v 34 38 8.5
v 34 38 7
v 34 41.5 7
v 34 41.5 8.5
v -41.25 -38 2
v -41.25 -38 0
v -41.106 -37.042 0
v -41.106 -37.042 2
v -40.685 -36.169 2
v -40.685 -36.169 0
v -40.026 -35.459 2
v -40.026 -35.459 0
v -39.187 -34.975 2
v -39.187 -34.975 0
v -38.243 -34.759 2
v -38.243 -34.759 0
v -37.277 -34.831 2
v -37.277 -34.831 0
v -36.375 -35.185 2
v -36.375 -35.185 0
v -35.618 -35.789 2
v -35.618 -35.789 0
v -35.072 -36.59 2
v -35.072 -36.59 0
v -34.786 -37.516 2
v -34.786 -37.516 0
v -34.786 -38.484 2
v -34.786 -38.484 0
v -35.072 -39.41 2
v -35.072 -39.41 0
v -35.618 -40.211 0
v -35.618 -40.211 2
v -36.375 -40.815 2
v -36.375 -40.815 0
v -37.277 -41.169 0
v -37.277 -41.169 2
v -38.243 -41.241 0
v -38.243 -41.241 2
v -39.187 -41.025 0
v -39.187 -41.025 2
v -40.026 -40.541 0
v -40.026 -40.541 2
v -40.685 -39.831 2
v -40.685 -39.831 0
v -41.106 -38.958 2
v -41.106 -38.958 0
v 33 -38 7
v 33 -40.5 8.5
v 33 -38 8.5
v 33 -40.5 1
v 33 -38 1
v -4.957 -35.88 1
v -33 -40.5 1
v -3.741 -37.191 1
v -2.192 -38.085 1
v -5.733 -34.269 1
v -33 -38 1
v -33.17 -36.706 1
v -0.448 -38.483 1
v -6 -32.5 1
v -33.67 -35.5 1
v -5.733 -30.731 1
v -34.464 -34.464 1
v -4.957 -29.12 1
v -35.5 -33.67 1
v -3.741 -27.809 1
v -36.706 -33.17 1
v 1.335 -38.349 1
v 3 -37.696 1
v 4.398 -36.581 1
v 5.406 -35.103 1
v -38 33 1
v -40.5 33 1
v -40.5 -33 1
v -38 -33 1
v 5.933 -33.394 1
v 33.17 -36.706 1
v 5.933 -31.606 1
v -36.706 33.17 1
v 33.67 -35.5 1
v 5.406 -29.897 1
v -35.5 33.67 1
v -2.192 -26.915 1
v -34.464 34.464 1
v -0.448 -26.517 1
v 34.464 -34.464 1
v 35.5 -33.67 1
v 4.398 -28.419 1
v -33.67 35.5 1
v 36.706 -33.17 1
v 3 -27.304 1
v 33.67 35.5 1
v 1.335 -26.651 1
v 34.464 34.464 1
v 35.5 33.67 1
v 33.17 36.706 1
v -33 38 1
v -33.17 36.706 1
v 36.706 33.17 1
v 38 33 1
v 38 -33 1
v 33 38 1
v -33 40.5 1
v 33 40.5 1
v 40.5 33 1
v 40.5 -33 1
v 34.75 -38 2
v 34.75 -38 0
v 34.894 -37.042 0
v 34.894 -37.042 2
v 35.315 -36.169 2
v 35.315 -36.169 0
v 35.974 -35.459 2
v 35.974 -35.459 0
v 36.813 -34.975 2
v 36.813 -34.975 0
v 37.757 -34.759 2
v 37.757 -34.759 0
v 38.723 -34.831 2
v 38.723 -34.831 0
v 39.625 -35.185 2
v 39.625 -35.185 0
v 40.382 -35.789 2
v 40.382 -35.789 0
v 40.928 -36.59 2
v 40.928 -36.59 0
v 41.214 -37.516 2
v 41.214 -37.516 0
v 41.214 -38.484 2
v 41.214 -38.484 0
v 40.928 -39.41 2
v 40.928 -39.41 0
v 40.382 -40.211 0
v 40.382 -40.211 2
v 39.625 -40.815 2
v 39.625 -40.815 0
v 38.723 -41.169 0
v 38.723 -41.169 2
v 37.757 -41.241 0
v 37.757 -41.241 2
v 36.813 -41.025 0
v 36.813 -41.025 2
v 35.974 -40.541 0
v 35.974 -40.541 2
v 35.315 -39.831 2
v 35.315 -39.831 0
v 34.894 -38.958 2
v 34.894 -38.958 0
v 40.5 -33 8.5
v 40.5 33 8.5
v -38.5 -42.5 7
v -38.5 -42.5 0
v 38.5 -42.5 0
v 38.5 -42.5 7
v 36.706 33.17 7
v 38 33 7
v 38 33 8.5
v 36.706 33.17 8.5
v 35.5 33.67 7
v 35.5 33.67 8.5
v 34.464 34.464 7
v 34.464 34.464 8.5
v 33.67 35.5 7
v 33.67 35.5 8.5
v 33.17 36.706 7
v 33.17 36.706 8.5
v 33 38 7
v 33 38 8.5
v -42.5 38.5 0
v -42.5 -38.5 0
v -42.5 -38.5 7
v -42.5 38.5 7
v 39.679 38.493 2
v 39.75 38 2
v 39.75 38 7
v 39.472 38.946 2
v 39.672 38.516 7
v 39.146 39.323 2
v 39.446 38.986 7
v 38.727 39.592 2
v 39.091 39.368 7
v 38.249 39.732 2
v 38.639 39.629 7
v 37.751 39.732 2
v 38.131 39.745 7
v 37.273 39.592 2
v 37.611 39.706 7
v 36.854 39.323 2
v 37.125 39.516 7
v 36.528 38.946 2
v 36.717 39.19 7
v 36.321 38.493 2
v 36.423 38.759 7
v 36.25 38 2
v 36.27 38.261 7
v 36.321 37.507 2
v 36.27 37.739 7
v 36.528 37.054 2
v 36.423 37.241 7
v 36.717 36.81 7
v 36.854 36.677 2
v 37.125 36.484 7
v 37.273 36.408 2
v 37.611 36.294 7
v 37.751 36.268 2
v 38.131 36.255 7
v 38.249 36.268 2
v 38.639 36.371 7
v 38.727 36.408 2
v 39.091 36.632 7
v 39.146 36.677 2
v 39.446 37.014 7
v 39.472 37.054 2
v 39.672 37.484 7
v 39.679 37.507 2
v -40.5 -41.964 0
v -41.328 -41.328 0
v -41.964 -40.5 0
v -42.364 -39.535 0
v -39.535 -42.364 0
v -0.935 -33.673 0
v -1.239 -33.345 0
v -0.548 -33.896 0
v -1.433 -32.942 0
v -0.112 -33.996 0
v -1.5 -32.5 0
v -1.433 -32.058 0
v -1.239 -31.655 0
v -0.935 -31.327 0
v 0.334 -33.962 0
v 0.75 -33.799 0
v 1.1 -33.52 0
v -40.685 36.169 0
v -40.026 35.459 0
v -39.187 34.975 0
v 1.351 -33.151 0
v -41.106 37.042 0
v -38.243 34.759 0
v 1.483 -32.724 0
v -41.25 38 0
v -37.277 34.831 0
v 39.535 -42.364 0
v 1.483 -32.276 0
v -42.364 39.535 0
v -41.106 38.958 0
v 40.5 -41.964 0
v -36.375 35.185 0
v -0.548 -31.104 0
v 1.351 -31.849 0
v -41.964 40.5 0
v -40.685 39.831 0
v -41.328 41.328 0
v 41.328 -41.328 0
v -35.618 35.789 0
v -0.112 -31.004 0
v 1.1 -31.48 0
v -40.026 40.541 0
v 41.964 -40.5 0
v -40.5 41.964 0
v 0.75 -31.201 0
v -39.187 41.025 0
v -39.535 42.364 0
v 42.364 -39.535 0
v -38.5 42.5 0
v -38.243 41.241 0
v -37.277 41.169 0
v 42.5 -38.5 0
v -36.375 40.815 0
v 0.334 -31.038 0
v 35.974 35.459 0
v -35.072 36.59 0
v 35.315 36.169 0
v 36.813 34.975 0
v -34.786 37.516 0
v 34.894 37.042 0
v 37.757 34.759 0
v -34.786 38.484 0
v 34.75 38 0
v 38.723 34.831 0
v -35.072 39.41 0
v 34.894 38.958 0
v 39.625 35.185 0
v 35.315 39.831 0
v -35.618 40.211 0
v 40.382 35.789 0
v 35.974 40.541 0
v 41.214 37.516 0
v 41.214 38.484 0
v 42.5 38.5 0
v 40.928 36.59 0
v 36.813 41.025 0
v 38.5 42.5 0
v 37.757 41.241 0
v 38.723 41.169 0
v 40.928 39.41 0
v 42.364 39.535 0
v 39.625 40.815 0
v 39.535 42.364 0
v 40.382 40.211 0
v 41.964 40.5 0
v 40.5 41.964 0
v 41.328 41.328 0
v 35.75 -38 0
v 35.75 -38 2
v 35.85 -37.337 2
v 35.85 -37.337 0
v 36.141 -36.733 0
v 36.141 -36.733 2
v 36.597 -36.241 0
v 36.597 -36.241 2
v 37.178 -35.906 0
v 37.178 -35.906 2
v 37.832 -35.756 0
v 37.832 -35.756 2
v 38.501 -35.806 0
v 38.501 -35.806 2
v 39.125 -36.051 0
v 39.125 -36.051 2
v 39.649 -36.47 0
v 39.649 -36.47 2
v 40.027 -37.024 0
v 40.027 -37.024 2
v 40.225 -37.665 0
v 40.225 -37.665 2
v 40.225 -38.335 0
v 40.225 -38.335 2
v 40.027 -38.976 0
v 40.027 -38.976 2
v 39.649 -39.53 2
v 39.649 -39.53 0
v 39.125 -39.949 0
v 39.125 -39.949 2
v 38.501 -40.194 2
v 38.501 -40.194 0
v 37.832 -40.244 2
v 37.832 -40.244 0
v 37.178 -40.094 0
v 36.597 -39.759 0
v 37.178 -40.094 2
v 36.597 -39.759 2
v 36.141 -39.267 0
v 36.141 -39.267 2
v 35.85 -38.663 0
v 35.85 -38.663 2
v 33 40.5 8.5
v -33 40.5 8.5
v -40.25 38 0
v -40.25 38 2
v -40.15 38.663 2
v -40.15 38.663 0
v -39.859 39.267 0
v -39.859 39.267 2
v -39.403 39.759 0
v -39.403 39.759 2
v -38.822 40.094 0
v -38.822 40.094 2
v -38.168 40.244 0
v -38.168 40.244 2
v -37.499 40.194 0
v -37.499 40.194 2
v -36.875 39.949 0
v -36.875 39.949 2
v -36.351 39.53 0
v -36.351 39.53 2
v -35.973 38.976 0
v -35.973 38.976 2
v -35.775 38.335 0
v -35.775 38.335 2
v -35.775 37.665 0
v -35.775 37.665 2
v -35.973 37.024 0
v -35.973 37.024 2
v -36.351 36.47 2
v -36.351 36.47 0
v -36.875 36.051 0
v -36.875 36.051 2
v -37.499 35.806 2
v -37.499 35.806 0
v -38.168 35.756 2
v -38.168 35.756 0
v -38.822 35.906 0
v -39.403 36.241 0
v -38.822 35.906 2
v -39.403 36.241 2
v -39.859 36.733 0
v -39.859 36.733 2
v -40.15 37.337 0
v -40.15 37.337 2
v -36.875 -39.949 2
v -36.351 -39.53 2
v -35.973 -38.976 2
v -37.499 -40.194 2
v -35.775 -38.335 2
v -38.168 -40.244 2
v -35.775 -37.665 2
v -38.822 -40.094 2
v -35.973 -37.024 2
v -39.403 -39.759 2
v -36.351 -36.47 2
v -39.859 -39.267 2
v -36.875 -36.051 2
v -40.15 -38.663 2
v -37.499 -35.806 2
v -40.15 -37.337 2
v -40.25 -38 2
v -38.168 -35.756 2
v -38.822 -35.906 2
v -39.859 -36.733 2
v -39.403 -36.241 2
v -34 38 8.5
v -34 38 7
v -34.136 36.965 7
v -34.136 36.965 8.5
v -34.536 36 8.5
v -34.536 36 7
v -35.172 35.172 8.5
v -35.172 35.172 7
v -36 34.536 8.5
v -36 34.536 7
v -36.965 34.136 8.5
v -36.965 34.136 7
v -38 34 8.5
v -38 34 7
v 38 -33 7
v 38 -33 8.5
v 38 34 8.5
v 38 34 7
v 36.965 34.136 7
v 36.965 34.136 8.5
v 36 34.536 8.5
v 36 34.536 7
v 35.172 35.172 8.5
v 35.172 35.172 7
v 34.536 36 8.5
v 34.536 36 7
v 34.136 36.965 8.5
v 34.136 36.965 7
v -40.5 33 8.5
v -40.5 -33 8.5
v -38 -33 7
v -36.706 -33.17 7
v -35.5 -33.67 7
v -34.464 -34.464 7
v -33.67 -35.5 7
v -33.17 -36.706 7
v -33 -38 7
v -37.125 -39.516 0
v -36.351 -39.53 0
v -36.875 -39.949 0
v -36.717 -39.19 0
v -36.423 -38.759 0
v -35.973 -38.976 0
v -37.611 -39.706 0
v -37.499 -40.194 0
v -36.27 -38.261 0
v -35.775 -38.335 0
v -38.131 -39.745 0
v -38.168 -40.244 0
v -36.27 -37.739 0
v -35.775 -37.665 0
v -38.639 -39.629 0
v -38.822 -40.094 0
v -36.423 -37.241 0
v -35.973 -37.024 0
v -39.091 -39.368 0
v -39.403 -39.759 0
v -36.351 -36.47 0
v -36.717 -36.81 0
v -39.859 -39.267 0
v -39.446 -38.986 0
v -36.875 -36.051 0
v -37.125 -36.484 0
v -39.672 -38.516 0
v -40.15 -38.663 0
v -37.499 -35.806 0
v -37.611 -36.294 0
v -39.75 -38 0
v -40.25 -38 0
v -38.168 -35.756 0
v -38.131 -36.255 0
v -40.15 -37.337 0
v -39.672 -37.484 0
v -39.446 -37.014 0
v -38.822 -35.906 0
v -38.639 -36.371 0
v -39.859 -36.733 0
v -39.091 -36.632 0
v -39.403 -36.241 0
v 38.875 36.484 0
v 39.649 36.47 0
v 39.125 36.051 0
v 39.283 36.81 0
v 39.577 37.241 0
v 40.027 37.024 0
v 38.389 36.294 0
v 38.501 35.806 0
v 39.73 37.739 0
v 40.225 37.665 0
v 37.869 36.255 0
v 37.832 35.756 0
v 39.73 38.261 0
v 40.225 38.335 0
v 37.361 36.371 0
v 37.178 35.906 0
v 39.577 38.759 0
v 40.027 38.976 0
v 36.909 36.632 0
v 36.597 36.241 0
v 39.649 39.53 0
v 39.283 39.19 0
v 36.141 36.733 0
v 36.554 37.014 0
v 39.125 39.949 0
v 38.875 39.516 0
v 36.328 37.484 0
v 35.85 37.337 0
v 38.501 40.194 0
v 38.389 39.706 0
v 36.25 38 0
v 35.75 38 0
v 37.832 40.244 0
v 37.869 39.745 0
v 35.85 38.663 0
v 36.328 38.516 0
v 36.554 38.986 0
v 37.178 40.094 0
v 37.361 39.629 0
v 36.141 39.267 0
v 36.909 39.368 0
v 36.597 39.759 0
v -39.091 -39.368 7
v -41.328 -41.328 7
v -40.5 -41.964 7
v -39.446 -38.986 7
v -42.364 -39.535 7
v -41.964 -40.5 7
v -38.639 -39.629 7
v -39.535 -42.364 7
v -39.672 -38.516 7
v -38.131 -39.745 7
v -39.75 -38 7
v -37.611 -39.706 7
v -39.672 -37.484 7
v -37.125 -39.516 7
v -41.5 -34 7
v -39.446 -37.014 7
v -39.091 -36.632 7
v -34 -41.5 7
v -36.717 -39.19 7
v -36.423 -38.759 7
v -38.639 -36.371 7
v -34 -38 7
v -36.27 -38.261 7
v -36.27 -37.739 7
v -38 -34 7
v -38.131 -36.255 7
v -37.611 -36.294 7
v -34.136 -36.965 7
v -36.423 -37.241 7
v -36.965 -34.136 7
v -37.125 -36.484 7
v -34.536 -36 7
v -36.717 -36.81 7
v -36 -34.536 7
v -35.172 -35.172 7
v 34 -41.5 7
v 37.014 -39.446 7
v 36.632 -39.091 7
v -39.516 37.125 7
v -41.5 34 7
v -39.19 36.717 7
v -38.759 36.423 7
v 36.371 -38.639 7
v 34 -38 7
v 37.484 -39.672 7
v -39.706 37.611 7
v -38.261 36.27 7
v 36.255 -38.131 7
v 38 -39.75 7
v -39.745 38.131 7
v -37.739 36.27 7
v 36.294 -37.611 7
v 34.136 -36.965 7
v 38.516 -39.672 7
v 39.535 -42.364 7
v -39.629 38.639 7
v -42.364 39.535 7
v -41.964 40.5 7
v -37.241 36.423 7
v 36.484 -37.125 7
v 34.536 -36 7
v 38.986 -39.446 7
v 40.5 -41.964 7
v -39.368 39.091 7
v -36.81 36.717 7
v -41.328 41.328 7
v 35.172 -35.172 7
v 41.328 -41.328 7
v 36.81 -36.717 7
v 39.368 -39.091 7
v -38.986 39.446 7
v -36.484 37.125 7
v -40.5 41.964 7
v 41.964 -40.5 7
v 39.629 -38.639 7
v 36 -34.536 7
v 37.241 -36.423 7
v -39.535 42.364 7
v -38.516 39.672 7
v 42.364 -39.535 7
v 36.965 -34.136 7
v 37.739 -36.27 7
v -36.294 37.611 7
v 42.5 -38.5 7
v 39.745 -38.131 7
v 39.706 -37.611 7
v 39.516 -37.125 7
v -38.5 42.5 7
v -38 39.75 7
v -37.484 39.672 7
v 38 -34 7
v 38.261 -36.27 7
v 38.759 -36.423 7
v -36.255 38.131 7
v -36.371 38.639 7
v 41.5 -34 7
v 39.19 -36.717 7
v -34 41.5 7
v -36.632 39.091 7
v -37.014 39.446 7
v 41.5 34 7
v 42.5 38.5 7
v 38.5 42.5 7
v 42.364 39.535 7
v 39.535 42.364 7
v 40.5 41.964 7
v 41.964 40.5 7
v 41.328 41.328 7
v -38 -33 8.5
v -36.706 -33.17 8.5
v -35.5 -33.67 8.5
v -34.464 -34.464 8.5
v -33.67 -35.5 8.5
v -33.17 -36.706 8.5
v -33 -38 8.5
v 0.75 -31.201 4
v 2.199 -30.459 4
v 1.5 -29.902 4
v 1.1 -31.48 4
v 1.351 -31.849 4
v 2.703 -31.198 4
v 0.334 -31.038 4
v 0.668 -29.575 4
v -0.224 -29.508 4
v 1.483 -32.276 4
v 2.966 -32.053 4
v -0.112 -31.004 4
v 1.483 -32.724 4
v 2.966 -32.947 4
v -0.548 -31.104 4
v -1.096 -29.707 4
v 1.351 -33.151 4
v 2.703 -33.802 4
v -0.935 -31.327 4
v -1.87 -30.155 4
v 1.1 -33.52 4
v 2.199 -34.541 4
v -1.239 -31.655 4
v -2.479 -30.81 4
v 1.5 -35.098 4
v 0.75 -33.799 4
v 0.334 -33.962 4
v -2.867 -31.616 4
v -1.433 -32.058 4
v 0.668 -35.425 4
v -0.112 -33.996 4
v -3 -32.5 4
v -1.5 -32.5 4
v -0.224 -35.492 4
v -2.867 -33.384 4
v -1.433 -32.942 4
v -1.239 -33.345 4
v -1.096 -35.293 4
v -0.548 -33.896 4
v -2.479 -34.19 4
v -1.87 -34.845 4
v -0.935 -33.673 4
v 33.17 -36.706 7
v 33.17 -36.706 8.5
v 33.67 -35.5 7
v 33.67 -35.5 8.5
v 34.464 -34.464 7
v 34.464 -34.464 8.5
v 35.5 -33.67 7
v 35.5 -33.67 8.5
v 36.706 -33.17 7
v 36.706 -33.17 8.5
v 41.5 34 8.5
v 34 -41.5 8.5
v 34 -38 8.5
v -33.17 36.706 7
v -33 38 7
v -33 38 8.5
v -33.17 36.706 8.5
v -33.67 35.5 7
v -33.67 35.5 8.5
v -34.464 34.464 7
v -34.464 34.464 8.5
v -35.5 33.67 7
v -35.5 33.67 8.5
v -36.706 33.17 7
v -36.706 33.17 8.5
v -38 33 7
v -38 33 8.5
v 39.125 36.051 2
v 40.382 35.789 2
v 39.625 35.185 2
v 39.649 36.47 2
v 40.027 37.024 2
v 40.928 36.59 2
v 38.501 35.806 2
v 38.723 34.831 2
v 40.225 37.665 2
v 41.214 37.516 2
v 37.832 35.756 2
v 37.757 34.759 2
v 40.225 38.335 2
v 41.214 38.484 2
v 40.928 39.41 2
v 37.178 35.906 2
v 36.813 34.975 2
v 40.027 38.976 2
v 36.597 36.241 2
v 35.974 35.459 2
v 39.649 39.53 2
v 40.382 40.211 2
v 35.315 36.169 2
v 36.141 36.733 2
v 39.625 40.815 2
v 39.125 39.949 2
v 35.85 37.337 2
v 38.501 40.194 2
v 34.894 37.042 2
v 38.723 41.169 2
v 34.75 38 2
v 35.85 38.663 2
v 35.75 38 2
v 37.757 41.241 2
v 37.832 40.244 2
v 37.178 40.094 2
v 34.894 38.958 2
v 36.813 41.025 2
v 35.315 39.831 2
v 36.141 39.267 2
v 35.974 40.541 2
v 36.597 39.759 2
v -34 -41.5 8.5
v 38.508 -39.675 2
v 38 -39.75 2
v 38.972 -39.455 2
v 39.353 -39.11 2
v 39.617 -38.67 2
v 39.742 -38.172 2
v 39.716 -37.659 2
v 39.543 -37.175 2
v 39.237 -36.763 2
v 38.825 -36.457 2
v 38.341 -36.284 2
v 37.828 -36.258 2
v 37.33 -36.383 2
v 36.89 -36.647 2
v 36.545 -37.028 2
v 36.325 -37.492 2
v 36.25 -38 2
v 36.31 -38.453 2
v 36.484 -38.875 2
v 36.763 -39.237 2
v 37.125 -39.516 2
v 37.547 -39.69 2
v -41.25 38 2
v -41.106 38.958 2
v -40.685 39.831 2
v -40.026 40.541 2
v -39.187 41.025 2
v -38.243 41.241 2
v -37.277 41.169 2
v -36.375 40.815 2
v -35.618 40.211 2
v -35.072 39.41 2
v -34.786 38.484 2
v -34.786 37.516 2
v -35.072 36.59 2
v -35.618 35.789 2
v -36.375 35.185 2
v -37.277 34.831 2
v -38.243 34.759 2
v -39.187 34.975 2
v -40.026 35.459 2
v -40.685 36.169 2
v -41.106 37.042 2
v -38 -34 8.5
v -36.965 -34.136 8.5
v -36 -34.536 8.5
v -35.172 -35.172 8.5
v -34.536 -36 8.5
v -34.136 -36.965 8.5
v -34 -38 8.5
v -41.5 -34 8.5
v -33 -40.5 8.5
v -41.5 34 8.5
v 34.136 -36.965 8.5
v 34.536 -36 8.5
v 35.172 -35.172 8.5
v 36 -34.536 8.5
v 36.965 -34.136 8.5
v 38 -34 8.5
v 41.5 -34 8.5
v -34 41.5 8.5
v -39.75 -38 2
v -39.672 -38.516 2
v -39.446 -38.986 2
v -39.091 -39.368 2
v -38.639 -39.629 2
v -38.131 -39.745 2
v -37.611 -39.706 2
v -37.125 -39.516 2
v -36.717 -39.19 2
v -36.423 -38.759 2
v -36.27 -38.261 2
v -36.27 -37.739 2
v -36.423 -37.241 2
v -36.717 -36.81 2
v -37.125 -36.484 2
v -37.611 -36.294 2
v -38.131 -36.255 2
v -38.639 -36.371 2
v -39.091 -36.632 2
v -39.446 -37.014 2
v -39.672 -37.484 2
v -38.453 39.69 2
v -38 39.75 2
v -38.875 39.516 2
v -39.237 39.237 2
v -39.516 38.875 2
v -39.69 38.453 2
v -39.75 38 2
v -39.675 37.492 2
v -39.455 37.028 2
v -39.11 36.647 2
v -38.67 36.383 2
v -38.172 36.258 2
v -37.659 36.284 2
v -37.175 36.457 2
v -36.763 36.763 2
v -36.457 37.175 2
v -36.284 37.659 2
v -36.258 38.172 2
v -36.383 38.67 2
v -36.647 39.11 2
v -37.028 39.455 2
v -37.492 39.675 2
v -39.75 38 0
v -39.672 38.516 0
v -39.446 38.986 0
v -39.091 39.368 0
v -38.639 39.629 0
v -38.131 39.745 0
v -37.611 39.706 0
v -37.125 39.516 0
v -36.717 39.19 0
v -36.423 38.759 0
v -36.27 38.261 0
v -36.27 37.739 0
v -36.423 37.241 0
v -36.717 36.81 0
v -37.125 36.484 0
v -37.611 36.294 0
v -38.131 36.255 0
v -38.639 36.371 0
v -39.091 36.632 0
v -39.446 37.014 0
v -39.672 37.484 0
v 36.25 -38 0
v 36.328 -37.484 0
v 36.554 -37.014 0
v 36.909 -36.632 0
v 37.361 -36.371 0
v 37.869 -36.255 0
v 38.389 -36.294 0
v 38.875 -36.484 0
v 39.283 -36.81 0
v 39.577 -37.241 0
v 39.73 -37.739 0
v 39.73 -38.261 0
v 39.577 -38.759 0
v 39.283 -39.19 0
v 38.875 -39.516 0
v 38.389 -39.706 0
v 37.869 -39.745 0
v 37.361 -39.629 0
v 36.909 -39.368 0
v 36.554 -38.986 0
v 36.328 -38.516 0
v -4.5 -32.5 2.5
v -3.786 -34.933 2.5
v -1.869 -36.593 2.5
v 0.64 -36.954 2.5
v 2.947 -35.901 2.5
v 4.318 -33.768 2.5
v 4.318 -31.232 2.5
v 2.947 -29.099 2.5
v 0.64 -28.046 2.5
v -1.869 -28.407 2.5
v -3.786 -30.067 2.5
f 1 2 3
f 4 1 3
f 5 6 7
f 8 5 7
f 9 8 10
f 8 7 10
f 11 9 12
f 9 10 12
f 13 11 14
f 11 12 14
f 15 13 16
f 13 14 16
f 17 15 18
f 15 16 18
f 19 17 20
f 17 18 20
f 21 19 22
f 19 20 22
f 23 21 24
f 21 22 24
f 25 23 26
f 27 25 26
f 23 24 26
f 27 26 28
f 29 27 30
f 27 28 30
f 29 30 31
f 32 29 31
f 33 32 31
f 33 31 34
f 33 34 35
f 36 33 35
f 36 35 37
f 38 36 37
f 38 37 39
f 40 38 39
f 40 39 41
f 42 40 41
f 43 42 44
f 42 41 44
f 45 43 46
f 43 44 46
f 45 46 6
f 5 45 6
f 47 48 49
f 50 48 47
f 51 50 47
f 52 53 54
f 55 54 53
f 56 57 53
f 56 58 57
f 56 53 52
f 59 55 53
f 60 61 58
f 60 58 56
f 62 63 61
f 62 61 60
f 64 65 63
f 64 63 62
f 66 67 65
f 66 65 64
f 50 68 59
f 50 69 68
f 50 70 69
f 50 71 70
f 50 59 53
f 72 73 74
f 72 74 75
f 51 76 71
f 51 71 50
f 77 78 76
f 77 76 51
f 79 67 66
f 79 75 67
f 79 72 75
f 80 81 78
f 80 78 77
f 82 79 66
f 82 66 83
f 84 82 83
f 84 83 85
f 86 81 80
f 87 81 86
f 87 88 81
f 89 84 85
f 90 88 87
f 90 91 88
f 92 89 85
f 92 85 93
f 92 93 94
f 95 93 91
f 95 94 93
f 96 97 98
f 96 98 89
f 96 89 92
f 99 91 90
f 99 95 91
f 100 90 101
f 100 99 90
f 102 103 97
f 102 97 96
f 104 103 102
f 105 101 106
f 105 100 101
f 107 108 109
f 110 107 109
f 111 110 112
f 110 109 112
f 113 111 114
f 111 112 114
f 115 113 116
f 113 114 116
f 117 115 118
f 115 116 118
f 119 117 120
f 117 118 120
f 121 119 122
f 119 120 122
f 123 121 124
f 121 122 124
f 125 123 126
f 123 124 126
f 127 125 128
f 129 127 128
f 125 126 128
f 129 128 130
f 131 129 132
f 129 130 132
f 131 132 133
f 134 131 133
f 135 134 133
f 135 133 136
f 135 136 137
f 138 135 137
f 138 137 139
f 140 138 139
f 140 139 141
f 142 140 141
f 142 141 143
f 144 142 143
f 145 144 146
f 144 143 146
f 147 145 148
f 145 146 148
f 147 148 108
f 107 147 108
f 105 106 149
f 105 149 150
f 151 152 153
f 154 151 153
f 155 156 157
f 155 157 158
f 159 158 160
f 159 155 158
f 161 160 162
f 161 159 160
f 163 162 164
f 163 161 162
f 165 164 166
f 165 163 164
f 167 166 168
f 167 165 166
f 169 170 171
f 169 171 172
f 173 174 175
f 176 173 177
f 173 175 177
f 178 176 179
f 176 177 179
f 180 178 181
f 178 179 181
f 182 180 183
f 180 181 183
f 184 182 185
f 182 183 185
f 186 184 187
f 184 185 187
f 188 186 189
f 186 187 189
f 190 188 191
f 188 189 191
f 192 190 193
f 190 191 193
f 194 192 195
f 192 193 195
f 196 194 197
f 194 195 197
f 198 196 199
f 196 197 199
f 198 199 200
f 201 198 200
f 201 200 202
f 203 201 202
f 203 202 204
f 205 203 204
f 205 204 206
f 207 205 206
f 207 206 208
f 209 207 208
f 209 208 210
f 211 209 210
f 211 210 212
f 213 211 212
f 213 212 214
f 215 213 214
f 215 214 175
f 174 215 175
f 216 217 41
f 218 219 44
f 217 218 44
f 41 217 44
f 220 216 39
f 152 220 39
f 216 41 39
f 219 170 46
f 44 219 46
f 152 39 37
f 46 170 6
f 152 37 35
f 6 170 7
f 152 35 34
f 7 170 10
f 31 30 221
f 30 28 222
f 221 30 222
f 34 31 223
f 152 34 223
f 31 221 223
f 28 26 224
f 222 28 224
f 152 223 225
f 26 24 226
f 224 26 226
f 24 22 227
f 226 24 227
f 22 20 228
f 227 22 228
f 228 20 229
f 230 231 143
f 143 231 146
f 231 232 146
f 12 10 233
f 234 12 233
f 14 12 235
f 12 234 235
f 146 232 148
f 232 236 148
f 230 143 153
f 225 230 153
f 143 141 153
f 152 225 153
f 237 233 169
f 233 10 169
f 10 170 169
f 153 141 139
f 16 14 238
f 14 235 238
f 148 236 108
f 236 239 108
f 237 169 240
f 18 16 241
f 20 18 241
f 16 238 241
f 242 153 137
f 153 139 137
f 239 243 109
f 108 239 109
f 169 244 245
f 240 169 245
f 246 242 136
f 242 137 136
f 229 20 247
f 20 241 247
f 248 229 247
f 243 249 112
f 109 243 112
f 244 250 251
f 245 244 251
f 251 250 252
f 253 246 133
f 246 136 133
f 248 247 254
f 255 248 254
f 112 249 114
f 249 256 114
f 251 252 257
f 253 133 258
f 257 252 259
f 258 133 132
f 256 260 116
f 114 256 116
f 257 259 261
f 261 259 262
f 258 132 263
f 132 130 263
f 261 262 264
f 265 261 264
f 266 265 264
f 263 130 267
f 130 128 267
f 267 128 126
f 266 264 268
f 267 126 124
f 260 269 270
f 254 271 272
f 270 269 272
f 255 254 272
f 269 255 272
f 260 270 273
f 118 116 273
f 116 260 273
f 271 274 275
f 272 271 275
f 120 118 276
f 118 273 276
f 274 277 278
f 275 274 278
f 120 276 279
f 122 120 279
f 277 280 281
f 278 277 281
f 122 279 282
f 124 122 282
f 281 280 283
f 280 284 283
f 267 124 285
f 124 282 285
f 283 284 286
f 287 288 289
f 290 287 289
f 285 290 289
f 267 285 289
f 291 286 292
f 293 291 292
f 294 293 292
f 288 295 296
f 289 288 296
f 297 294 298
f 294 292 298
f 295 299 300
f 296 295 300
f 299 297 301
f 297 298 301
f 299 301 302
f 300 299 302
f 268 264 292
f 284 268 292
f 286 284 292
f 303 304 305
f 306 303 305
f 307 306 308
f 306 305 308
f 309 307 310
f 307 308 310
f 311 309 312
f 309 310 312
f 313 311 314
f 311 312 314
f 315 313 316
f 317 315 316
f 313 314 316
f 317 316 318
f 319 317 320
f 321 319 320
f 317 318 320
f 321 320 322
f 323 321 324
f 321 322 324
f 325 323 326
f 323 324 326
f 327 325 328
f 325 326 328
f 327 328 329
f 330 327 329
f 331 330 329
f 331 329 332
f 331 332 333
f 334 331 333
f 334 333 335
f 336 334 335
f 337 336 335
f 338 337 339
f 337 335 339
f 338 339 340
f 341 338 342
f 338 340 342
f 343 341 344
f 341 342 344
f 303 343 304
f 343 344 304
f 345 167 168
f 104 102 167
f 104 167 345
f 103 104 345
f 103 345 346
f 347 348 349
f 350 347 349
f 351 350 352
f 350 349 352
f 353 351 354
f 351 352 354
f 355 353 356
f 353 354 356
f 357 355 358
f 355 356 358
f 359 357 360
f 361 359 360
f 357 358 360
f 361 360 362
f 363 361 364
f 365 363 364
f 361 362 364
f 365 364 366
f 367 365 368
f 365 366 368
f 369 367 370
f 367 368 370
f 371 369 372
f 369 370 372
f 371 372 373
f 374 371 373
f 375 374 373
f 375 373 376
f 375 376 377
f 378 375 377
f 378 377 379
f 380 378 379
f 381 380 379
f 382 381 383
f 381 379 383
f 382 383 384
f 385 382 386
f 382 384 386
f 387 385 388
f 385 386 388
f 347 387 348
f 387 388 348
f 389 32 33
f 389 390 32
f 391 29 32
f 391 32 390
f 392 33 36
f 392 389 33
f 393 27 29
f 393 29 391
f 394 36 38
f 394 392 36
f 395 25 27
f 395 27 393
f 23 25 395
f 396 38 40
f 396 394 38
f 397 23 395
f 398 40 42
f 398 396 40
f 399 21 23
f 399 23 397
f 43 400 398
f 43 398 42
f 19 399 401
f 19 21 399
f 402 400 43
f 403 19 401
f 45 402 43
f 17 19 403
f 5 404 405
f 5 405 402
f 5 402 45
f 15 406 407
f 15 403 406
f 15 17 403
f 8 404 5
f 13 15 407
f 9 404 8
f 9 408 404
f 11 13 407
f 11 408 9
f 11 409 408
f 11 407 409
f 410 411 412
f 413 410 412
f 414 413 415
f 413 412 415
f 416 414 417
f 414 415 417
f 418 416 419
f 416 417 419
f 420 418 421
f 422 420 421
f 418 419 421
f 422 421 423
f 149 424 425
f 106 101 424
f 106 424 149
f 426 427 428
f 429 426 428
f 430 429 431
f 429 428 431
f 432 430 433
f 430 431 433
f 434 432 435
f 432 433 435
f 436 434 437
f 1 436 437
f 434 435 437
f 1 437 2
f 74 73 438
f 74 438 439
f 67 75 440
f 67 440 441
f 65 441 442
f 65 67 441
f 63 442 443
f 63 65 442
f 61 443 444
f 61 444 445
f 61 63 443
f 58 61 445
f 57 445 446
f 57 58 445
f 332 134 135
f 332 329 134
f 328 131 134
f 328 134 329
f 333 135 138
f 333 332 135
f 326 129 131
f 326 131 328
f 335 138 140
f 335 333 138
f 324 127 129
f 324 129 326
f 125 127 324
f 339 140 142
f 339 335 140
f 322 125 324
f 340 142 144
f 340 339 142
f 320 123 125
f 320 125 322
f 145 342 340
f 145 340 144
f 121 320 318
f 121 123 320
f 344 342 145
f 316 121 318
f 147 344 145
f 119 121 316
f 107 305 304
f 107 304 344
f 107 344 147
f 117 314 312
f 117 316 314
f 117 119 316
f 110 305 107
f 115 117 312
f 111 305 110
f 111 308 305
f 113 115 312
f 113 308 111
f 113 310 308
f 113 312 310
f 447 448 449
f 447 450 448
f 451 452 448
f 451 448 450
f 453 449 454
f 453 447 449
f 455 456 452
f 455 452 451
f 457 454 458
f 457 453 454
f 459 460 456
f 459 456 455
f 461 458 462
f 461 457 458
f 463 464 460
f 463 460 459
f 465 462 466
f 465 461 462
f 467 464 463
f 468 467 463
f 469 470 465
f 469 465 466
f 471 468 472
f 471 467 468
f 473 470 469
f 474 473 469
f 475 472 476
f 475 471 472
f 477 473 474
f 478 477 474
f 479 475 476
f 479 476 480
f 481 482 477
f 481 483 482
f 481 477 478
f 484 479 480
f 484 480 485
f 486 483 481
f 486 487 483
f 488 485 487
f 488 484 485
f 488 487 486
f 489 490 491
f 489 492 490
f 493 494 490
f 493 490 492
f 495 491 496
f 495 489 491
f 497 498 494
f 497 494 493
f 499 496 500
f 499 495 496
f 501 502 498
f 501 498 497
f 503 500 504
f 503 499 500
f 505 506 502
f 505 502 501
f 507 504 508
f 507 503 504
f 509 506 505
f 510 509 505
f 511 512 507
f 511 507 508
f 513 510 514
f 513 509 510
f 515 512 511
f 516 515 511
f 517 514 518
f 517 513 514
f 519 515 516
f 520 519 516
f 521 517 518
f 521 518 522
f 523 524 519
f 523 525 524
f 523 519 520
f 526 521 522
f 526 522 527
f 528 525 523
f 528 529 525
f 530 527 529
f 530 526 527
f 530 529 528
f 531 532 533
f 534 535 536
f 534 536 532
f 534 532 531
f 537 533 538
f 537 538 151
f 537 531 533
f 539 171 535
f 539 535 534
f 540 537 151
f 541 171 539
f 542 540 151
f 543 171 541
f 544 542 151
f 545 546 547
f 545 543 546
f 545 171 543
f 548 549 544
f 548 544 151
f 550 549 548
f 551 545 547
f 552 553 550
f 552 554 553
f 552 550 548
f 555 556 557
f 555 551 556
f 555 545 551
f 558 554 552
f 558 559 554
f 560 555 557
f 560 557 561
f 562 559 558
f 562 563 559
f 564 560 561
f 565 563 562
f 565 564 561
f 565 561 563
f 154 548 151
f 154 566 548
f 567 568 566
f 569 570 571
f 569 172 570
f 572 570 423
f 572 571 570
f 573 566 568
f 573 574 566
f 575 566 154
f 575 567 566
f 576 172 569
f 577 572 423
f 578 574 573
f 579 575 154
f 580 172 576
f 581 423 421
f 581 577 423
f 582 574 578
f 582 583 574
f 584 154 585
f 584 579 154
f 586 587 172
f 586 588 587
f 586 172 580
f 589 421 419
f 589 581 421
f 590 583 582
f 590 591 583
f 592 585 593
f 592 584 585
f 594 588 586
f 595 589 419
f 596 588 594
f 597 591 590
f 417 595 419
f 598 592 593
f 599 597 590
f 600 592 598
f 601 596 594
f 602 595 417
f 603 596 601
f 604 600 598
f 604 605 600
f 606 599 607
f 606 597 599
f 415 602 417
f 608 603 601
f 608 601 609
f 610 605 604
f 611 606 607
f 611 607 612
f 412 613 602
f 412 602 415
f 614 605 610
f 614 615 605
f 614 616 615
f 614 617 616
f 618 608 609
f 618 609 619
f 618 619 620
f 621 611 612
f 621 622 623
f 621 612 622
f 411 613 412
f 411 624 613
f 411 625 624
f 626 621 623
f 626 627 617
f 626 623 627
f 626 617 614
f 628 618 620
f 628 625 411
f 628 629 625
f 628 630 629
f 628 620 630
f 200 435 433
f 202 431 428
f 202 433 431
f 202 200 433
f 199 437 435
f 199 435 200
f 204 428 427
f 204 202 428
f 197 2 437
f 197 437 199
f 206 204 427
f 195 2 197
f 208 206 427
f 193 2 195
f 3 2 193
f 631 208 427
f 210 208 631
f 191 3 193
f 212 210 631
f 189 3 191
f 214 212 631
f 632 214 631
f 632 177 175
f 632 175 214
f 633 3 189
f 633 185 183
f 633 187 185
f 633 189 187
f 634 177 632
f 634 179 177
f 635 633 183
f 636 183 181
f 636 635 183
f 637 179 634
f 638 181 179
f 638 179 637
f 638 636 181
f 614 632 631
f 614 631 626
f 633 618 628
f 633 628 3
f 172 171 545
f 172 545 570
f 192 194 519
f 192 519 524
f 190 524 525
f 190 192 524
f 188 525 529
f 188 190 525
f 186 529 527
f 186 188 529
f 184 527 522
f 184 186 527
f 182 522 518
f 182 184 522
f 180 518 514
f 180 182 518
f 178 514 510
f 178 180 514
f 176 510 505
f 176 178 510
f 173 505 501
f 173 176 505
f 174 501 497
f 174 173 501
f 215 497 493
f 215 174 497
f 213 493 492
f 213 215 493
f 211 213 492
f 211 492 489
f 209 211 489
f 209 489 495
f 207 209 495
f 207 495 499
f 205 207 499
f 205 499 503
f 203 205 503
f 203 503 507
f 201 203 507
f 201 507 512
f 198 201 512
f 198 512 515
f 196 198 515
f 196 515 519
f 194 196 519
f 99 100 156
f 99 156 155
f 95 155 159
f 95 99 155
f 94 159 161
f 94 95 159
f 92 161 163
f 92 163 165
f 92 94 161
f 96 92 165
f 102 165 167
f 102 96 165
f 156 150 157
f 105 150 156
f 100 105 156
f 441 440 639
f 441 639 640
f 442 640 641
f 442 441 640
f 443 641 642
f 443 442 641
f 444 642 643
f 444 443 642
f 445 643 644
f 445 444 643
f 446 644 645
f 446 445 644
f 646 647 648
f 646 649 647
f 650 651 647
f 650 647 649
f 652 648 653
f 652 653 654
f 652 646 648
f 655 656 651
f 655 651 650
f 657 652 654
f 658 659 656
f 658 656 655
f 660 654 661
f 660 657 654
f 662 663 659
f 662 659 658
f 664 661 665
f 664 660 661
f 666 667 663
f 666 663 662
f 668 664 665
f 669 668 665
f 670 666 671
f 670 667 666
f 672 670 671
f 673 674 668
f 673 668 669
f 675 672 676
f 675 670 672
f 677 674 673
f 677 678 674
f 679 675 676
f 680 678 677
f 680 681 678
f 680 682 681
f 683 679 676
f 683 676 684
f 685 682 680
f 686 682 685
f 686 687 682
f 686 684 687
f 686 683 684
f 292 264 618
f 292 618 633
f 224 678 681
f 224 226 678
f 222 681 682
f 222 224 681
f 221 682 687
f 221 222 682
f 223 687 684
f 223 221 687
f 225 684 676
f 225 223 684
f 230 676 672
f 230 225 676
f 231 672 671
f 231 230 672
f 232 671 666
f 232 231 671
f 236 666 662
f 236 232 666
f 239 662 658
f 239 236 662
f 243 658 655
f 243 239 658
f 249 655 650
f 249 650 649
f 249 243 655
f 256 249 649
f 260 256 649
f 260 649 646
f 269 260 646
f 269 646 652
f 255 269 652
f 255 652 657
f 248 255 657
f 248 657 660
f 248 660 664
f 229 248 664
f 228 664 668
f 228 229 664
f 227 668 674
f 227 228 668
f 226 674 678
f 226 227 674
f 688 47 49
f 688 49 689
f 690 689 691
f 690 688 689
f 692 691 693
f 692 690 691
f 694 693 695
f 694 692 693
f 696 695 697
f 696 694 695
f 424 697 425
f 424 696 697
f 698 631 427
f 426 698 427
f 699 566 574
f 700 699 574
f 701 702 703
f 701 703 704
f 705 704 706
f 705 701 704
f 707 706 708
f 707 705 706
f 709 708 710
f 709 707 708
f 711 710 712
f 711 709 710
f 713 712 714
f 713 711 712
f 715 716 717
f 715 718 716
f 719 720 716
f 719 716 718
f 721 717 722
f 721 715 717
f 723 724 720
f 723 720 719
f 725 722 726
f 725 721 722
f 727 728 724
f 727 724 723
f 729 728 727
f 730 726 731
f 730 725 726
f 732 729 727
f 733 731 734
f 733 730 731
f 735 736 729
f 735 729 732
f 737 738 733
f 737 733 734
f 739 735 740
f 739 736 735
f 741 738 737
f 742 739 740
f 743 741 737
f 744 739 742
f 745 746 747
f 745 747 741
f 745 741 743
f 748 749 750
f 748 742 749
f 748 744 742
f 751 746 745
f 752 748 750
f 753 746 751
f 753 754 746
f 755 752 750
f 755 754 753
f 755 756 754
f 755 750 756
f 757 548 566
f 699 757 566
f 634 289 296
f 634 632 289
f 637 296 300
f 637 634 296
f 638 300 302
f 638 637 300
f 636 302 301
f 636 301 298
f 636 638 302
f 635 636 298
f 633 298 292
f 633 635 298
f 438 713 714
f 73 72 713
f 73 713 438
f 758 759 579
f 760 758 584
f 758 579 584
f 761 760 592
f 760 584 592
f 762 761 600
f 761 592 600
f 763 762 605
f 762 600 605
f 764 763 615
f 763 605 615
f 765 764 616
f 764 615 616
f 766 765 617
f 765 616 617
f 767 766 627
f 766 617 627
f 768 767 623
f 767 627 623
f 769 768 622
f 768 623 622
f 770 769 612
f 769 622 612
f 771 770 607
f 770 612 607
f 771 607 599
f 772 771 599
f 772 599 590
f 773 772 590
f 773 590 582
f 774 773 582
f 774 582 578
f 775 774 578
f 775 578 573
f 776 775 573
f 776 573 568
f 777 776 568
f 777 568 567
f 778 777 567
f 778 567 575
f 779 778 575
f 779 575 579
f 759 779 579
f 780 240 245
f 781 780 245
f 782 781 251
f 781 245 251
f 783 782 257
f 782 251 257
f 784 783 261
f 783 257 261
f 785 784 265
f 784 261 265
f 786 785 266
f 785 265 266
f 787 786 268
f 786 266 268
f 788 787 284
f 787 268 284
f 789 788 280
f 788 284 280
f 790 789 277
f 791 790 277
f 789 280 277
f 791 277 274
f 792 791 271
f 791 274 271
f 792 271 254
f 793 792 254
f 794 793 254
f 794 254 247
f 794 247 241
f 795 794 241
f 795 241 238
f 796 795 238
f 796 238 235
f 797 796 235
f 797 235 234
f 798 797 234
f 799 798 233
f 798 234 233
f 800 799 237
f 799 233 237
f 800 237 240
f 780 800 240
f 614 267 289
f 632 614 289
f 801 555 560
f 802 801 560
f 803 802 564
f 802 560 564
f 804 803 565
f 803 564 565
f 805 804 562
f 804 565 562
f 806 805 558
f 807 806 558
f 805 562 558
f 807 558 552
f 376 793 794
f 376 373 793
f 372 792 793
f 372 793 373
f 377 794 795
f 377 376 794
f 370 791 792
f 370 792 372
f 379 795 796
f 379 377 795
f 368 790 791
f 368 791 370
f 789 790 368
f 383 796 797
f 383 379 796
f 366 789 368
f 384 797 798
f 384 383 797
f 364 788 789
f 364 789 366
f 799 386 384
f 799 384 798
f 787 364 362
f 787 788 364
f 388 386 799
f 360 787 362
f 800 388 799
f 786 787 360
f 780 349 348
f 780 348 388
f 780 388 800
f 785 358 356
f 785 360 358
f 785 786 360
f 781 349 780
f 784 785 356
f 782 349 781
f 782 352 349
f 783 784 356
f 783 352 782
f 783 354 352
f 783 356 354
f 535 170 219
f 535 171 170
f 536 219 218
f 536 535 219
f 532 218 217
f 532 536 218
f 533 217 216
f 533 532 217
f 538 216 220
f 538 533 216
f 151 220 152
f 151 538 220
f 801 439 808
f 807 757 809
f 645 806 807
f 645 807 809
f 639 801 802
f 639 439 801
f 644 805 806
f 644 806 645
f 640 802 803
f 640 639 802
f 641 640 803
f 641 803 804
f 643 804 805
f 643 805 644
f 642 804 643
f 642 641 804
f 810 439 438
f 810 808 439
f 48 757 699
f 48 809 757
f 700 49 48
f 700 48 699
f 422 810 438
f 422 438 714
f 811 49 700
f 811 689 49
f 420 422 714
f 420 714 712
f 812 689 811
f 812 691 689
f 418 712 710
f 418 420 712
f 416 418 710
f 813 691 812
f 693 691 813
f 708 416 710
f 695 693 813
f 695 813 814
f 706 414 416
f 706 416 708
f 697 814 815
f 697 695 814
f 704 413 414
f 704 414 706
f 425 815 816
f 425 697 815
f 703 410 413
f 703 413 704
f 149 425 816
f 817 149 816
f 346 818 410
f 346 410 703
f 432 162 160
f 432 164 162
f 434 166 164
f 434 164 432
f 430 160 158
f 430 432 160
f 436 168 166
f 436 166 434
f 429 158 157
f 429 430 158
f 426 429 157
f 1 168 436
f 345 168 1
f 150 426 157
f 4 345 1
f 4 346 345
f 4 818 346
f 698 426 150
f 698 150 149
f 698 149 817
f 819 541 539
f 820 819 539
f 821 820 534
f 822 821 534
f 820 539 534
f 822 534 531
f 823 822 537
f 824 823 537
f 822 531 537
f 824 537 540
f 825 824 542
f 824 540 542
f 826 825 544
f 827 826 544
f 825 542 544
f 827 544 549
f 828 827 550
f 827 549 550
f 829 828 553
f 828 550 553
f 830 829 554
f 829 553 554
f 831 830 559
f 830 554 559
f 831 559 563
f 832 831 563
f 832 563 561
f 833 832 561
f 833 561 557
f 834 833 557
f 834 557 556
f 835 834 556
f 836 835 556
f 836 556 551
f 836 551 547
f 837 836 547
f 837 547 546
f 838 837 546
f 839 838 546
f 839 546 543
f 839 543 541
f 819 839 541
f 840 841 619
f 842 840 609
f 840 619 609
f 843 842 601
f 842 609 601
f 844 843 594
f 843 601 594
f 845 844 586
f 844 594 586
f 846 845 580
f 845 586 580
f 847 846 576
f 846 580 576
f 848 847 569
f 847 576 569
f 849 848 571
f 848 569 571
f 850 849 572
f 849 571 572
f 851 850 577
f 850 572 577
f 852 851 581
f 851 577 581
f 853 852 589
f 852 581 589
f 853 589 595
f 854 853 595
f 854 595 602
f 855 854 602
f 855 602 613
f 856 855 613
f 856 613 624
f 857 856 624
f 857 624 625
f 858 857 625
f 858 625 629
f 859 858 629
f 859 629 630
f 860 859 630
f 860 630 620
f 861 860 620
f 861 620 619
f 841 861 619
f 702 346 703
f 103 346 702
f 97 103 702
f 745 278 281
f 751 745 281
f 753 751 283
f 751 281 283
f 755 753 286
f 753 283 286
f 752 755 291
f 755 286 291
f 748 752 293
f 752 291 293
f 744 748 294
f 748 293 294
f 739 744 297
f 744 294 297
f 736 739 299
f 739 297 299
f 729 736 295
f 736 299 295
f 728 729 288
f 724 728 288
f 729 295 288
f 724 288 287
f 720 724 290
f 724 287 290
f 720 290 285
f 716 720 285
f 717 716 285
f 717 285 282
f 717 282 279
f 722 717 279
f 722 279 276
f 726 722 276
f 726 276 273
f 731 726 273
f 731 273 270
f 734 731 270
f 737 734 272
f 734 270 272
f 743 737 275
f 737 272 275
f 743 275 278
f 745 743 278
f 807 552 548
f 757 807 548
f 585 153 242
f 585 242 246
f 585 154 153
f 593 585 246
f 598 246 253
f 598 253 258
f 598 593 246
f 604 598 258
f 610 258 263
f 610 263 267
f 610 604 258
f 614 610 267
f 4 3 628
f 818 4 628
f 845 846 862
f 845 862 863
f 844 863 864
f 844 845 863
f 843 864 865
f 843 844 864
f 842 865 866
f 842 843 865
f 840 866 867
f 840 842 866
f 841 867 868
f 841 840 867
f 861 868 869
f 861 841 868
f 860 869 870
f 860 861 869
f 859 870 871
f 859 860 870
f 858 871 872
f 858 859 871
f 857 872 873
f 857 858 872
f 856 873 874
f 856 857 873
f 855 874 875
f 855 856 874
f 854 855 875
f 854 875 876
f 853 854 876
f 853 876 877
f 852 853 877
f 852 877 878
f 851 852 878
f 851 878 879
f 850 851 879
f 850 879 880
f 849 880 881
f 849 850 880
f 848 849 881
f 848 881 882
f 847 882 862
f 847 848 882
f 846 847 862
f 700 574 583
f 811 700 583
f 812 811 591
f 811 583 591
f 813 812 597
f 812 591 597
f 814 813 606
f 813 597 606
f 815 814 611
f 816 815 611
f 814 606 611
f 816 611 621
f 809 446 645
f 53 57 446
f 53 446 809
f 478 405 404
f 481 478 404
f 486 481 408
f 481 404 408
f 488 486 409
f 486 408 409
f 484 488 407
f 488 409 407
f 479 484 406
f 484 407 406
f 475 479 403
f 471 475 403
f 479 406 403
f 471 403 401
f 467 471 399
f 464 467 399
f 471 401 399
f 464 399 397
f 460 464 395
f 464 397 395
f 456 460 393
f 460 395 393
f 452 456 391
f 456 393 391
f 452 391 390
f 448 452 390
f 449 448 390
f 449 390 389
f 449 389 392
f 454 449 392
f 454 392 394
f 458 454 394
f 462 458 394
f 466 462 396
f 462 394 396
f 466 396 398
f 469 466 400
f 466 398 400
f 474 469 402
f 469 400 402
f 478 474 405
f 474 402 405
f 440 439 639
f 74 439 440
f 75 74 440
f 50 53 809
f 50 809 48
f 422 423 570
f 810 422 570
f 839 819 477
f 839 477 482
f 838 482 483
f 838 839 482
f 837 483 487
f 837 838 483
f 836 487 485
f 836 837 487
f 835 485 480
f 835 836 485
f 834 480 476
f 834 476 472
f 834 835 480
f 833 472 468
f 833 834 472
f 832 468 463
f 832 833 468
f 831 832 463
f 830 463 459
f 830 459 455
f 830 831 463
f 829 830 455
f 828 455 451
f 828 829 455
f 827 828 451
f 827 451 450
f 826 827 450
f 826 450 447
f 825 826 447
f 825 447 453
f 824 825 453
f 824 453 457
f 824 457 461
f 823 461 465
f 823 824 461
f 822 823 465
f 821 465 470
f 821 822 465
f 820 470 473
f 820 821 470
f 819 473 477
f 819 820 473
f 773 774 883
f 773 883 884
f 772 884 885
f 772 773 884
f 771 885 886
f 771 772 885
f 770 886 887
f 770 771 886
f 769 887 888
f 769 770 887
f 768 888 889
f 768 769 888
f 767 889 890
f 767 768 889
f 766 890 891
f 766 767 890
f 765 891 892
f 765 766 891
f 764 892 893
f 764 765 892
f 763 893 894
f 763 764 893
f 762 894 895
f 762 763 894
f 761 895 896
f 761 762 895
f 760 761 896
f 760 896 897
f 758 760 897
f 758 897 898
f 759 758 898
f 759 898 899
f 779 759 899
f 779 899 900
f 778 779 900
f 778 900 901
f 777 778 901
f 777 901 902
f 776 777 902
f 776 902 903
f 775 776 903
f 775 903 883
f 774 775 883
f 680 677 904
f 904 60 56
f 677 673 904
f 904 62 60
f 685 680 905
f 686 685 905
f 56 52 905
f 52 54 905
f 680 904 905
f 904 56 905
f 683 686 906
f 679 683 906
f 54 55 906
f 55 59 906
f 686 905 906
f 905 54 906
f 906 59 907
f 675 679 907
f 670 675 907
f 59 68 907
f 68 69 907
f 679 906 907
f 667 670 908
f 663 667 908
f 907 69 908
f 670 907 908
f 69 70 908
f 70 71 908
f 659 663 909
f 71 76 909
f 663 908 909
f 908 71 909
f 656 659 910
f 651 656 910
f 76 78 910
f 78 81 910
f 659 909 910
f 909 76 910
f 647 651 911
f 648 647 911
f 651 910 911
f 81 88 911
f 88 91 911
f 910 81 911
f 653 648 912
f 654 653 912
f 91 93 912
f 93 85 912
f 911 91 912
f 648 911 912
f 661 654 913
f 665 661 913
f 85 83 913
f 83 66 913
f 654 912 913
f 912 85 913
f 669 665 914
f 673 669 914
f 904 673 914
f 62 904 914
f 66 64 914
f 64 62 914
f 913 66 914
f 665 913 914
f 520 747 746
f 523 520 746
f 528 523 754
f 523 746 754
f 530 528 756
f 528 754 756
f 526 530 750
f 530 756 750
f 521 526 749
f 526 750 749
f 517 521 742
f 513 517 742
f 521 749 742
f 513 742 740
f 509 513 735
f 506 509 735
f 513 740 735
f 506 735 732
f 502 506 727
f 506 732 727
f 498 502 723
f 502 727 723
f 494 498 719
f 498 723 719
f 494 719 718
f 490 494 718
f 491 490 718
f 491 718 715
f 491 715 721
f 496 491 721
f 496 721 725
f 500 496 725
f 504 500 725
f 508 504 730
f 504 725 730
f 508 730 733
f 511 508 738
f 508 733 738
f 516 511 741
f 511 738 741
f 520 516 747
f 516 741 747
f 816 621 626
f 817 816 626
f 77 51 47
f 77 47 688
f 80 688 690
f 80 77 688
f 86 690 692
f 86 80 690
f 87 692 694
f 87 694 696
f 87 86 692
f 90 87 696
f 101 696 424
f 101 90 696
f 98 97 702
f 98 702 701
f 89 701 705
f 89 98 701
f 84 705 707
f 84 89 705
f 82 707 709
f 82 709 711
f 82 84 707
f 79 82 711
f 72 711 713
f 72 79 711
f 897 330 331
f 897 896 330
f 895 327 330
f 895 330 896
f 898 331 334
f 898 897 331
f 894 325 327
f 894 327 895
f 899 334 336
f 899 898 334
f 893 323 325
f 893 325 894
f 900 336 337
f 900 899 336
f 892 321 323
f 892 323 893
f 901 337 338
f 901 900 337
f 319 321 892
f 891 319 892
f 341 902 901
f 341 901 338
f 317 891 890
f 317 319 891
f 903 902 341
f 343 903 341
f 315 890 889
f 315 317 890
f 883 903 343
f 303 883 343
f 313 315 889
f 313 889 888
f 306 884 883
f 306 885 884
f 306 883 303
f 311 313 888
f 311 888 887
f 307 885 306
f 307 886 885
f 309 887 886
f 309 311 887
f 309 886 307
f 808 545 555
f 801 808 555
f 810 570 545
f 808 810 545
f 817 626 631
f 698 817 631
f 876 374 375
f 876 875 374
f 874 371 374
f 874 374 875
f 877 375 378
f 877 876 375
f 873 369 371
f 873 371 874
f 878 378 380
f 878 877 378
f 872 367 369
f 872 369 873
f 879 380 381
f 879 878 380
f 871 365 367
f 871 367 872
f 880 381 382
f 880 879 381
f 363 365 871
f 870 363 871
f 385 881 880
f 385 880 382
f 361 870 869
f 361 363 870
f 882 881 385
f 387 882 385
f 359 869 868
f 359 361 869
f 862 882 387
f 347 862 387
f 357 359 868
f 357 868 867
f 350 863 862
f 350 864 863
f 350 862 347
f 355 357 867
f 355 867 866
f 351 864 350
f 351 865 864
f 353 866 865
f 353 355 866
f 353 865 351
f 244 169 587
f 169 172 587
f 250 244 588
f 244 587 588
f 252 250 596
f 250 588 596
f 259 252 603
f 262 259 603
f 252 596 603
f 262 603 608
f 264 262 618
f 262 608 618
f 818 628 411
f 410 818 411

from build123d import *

# Parameters (mm, degrees)
SKETCH1_W                = 85
SKETCH1_H                = 85
BOSS_EXTRUDE1_DEPTH      = 7
FILLET1_R                = 4
SHELL1_T                 = -2
SHELL1_THICKNESS_2_DEPTH = 1
BOSS_EXTRUDE2_START      = 1
BOSS_EXTRUDE2_DEPTH      = 6
CIRPATTERN5_COUNT        = 4
SKETCH4_R                = 1.75
CUT_EXTRUDE1_DEPTH       = 61.510329697
MOVE_FACE1_BY            = 0.5
MOVE_FACE1_2_BY          = 0.5
MOVE_FACE1_3_BY          = 0.5
MOVE_FACE1_4_BY          = 0.5
MOVE_FACE1_5_BY          = 0.5
MOVE_FACE1_6_BY          = 0.5
MOVE_FACE1_7_BY          = 0.5
MOVE_FACE1_8_BY          = 0.5
MOVE_FACE1_9_BY          = 0.5
MOVE_FACE1_10_BY         = 0.5
MOVE_FACE1_11_BY         = 0.5
MOVE_FACE1_12_BY         = 0.5
EXTRUDE_THIN1_DEPTH      = 1.5
CIRPATTERN6_COUNT        = 4
SKETCH15_R               = 3.25
CUT_EXTRUDE5_DEPTH       = 2
EXTRUDE_THIN2_START      = -2
SKETCH16_R               = 2.25
SKETCH16_R_2             = 1.75
EXTRUDE_THIN2_DEPTH      = 2
SKETCH17_R               = 1.5
CUT_EXTRUDE6_DEPTH       = 61.702141643
SKETCH22_R               = 3
SKETCH22_R_2             = 1.5
BOSS_EXTRUDE5_DEPTH      = 3
CHAMFER2_SIZE            = 3


with BuildPart() as part:
    # Sketch1 → Boss-Extrude1 (new body)
    with BuildSketch(Plane.XY):
        Rectangle(SKETCH1_W, SKETCH1_H)
    extrude(amount=BOSS_EXTRUDE1_DEPTH)

    # Fillet1
    fillet1_edges = [part.edges().sort_by_distance(p)[0] for p in [
        (42.5, -42.5, 3.5),
        (-42.5, -42.5, 3.5),
        (-42.5, 42.5, 3.5),
        (42.5, 42.5, 3.5),
    ]]
    fillet(fillet1_edges, radius=FILLET1_R)

    # Shell1
    shell1_openings = [part.faces().sort_by_distance(p)[0] for p in [
        (0, 0, 7),
    ]]
    offset(amount=SHELL1_T, openings=shell1_openings, kind=Kind.INTERSECTION)

    # Shell1 thickness 2 face (on inner face of the shell) → Shell1 thickness 2 (cut)
    with BuildSketch(Plane(origin=(0, 0, 2), x_dir=(-1, 0, 0), z_dir=(0, 0, -1))):
        with BuildLine():
            ThreePointArc((40.5, -38.5), (39.914213562, -39.914213562), (38.5, -40.5))
            Line((38.5, -40.5), (-38.5, -40.5))
            ThreePointArc((-38.5, -40.5), (-39.914213562, -39.914213562), (-40.5, -38.5))
            Line((-40.5, -38.5), (-40.5, 38.5))
            ThreePointArc((-40.5, 38.5), (-39.914213562, 39.914213562), (-38.5, 40.5))
            Line((-38.5, 40.5), (38.5, 40.5))
            ThreePointArc((38.5, 40.5), (39.914213562, 39.914213562), (40.5, 38.5))
            Line((40.5, 38.5), (40.5, -38.5))
        make_face()
    extrude(amount=SHELL1_THICKNESS_2_DEPTH, mode=Mode.SUBTRACT)


with BuildPart() as body_2:
    # Sketch3 → Boss-Extrude2 (new body)
    with BuildSketch(Plane.XY.offset(BOSS_EXTRUDE2_START)):
        with BuildLine():
            Line((33.5, 38), (33.5, 42.5))
            Line((33.5, 42.5), (38, 42.5))
            ThreePointArc((38, 42.5), (41.181980515, 41.181980515), (42.5, 38))
            Line((42.5, 38), (42.5, 33.5))
            Line((42.5, 33.5), (38, 33.5))
            ThreePointArc((38, 33.5), (34.818019485, 34.818019485), (33.5, 38))
        make_face()
    extrude(amount=BOSS_EXTRUDE2_DEPTH)


with BuildPart() as cirpattern5_1:
    # CirPattern5: pattern copy
    add(body_2.part.rotate(Axis((0, 0, 0), (0, 0, 1)), 1 * 360 / CIRPATTERN5_COUNT))


with BuildPart() as cirpattern5_2:
    # CirPattern5: pattern copy
    add(body_2.part.rotate(Axis((0, 0, 0), (0, 0, 1)), 2 * 360 / CIRPATTERN5_COUNT))


with BuildPart() as cirpattern5_3:
    # CirPattern5: pattern copy
    add(body_2.part.rotate(Axis((0, 0, 0), (0, 0, 1)), 3 * 360 / CIRPATTERN5_COUNT))


with BuildPart() as part_1:
    add(part.part)

    # Combine1: union CirPattern5_1, body 2, CirPattern5_2, CirPattern5_3
    add(cirpattern5_1.part)
    add(body_2.part)
    add(cirpattern5_2.part)
    add(cirpattern5_3.part)

    # Sketch4 → Cut-Extrude1 (cut, through all)
    with BuildSketch(Plane.XY.offset(7)):
        with Locations((38, 38)):
            Circle(SKETCH4_R)
    cut_extrude1 = extrude(amount=-CUT_EXTRUDE1_DEPTH, mode=Mode.SUBTRACT)

    # Move Face1: a face moved outward by 0.5
    extrude(part_1.faces().sort_by_distance((-33.5, 39.25, 4))[0], amount=MOVE_FACE1_BY, dir=(1, 0, 0))

    # Move Face1 2: a curved face moved outward by 0.5
    add(Solid.thicken(part_1.faces().sort_by_distance((-34.818019485, 34.818019485, 4))[0], MOVE_FACE1_2_BY))

    # Move Face1 3: a face moved outward by 0.5
    extrude(part_1.faces().sort_by_distance((-39.25, 33.5, 4))[0], amount=MOVE_FACE1_3_BY, dir=(0, -1, 0))

    # Move Face1 4: a face moved outward by 0.5
    extrude(part_1.faces().sort_by_distance((-33.5, -39.25, 4))[0], amount=MOVE_FACE1_4_BY, dir=(1, 0, 0))

    # Move Face1 5: a face moved outward by 0.5
    extrude(part_1.faces().sort_by_distance((-39.25, -33.5, 4))[0], amount=MOVE_FACE1_5_BY, dir=(0, 1, 0))

    # Move Face1 6: a curved face moved outward by 0.5
    add(Solid.thicken(part_1.faces().sort_by_distance((-34.818019485, -34.818019485, 4))[0], MOVE_FACE1_6_BY))

    # Move Face1 7: a face moved outward by 0.5
    extrude(part_1.faces().sort_by_distance((33.5, -39.25, 4))[0], amount=MOVE_FACE1_7_BY, dir=(-1, 0, 0))

    # Move Face1 8: a curved face moved outward by 0.5
    add(Solid.thicken(part_1.faces().sort_by_distance((34.818019485, -34.818019485, 4))[0], MOVE_FACE1_8_BY))

    # Move Face1 9: a face moved outward by 0.5
    extrude(part_1.faces().sort_by_distance((39.25, -33.5, 4))[0], amount=MOVE_FACE1_9_BY, dir=(0, 1, 0))

    # Move Face1 10: a face moved outward by 0.5
    extrude(part_1.faces().sort_by_distance((39.25, 33.5, 4))[0], amount=MOVE_FACE1_10_BY, dir=(0, -1, 0))

    # Move Face1 11: a face moved outward by 0.5
    extrude(part_1.faces().sort_by_distance((33.5, 39.25, 4))[0], amount=MOVE_FACE1_11_BY, dir=(-1, 0, 0))

    # Move Face1 12: a curved face moved outward by 0.5
    add(Solid.thicken(part_1.faces().sort_by_distance((34.818019485, 34.818019485, 4))[0], MOVE_FACE1_12_BY))

    # Sketch7 → Extrude-Thin1 (add)
    with BuildSketch(Plane.XY.offset(7)):
        with BuildLine():
            Line((38, -34), (41.5, -34))
            Line((41.5, -34), (41.5, 34))
            Line((41.5, 34), (38, 34))
            ThreePointArc((38, 34), (35.171572875, 35.171572875), (34, 38))
            Line((34, 38), (34, 41.5))
            Line((34, 41.5), (-34, 41.5))
            Line((-34, 41.5), (-34, 38))
            ThreePointArc((-34, 38), (-35.171572875, 35.171572875), (-38, 34))
            Line((-38, 34), (-41.5, 34))
            Line((-41.5, 34), (-41.5, -34))
            Line((-41.5, -34), (-38, -34))
            ThreePointArc((-38, -34), (-35.171572875, -35.171572875), (-34, -38))
            Line((-34, -38), (-34, -41.5))
            Line((-34, -41.5), (34, -41.5))
            Line((34, -41.5), (34, -38))
            ThreePointArc((34, -38), (35.171572875, -35.171572875), (38, -34))
        make_face()
        with BuildLine():
            Line((38, -33), (40.5, -33))
            Line((40.5, -33), (40.5, 33))
            Line((40.5, 33), (38, 33))
            ThreePointArc((38, 33), (34.464466094, 34.464466094), (33, 38))
            Line((33, 38), (33, 40.5))
            Line((33, 40.5), (-33, 40.5))
            Line((-33, 40.5), (-33, 38))
            ThreePointArc((-33, 38), (-34.464466094, 34.464466094), (-38, 33))
            Line((-38, 33), (-40.5, 33))
            Line((-40.5, 33), (-40.5, -33))
            Line((-40.5, -33), (-38, -33))
            ThreePointArc((-38, -33), (-34.464466094, -34.464466094), (-33, -38))
            Line((-33, -38), (-33, -40.5))
            Line((-33, -40.5), (33, -40.5))
            Line((33, -40.5), (33, -38))
            ThreePointArc((33, -38), (34.464466094, -34.464466094), (38, -33))
        make_face(mode=Mode.SUBTRACT)
    extrude(amount=EXTRUDE_THIN1_DEPTH)

    # CirPattern6: Cut-Extrude1 ×4 about axis
    cirpattern6_axis = Axis((0, 0, 0), (0, 0, 1))
    for i in range(1, CIRPATTERN6_COUNT):
        add(cut_extrude1.rotate(cirpattern6_axis, i * 360 / CIRPATTERN6_COUNT), mode=Mode.SUBTRACT)

    # Sketch15 → Cut-Extrude5 (cut)
    with BuildSketch(Plane(origin=(0, 0, 0), x_dir=(-1, 0, 0), z_dir=(0, 0, -1))):
        with Locations((-38, -38)):
            Circle(SKETCH15_R)
        with Locations((38, -38)):
            Circle(SKETCH15_R)
        with Locations((38, 38)):
            Circle(SKETCH15_R)
        with Locations((-38, 38)):
            Circle(SKETCH15_R)
    extrude(amount=-CUT_EXTRUDE5_DEPTH, mode=Mode.SUBTRACT)

    # Sketch16 → Extrude-Thin2 (add)
    # profile 1 of 4: a face of its own
    with BuildSketch(Plane(origin=(0, 0, 0), x_dir=(-1, 0, 0), z_dir=(0, 0, -1)).offset(EXTRUDE_THIN2_START)):
        with Locations((-38, -38)):
            Circle(SKETCH16_R)
        with Locations((-38, -38)):
            Circle(SKETCH16_R_2, mode=Mode.SUBTRACT)
    # profile 2 of 4: a face of its own
    with BuildSketch(Plane(origin=(0, 0, 0), x_dir=(-1, 0, 0), z_dir=(0, 0, -1)).offset(EXTRUDE_THIN2_START)):
        with Locations((-38, 38)):
            Circle(SKETCH16_R)
        with Locations((-38, 38)):
            Circle(SKETCH16_R_2, mode=Mode.SUBTRACT)
    # profile 3 of 4: a face of its own
    with BuildSketch(Plane(origin=(0, 0, 0), x_dir=(-1, 0, 0), z_dir=(0, 0, -1)).offset(EXTRUDE_THIN2_START)):
        with Locations((38, -38)):
            Circle(SKETCH16_R)
        with Locations((38, -38)):
            Circle(SKETCH16_R_2, mode=Mode.SUBTRACT)
    # profile 4 of 4: a face of its own
    with BuildSketch(Plane(origin=(0, 0, 0), x_dir=(-1, 0, 0), z_dir=(0, 0, -1)).offset(EXTRUDE_THIN2_START)):
        with Locations((38, 38)):
            Circle(SKETCH16_R)
        with Locations((38, 38)):
            Circle(SKETCH16_R_2, mode=Mode.SUBTRACT)
    extrude(amount=EXTRUDE_THIN2_DEPTH)

    # Sketch17 → Cut-Extrude6 (cut, through all)
    with BuildSketch(Plane(origin=(0, 0, 0), x_dir=(-1, 0, 0), z_dir=(0, 0, -1))):
        with Locations((0, -32.5)):
            Circle(SKETCH17_R)
    extrude(amount=-CUT_EXTRUDE6_DEPTH, mode=Mode.SUBTRACT)

    # Sketch22 → Boss-Extrude5 (add)
    with BuildSketch(Plane.XY.offset(1)):
        with Locations(Location((0, -32.5, 0), (0, 0, 180))):
            Circle(SKETCH22_R)
        with Locations(Location((0, -32.5, 0), (0, 0, 180))):
            Circle(SKETCH22_R_2, mode=Mode.SUBTRACT)
    extrude(amount=BOSS_EXTRUDE5_DEPTH)

    # Chamfer2
    chamfer2_edges = [part_1.edges().sort_by_distance(p)[0] for p in [
        (3, -32.5, 1),
    ]]
    chamfer(chamfer2_edges, length=CHAMFER2_SIZE - 0.0001)  # a hair under: the kernel refuses the full size


solid = part_1.part
